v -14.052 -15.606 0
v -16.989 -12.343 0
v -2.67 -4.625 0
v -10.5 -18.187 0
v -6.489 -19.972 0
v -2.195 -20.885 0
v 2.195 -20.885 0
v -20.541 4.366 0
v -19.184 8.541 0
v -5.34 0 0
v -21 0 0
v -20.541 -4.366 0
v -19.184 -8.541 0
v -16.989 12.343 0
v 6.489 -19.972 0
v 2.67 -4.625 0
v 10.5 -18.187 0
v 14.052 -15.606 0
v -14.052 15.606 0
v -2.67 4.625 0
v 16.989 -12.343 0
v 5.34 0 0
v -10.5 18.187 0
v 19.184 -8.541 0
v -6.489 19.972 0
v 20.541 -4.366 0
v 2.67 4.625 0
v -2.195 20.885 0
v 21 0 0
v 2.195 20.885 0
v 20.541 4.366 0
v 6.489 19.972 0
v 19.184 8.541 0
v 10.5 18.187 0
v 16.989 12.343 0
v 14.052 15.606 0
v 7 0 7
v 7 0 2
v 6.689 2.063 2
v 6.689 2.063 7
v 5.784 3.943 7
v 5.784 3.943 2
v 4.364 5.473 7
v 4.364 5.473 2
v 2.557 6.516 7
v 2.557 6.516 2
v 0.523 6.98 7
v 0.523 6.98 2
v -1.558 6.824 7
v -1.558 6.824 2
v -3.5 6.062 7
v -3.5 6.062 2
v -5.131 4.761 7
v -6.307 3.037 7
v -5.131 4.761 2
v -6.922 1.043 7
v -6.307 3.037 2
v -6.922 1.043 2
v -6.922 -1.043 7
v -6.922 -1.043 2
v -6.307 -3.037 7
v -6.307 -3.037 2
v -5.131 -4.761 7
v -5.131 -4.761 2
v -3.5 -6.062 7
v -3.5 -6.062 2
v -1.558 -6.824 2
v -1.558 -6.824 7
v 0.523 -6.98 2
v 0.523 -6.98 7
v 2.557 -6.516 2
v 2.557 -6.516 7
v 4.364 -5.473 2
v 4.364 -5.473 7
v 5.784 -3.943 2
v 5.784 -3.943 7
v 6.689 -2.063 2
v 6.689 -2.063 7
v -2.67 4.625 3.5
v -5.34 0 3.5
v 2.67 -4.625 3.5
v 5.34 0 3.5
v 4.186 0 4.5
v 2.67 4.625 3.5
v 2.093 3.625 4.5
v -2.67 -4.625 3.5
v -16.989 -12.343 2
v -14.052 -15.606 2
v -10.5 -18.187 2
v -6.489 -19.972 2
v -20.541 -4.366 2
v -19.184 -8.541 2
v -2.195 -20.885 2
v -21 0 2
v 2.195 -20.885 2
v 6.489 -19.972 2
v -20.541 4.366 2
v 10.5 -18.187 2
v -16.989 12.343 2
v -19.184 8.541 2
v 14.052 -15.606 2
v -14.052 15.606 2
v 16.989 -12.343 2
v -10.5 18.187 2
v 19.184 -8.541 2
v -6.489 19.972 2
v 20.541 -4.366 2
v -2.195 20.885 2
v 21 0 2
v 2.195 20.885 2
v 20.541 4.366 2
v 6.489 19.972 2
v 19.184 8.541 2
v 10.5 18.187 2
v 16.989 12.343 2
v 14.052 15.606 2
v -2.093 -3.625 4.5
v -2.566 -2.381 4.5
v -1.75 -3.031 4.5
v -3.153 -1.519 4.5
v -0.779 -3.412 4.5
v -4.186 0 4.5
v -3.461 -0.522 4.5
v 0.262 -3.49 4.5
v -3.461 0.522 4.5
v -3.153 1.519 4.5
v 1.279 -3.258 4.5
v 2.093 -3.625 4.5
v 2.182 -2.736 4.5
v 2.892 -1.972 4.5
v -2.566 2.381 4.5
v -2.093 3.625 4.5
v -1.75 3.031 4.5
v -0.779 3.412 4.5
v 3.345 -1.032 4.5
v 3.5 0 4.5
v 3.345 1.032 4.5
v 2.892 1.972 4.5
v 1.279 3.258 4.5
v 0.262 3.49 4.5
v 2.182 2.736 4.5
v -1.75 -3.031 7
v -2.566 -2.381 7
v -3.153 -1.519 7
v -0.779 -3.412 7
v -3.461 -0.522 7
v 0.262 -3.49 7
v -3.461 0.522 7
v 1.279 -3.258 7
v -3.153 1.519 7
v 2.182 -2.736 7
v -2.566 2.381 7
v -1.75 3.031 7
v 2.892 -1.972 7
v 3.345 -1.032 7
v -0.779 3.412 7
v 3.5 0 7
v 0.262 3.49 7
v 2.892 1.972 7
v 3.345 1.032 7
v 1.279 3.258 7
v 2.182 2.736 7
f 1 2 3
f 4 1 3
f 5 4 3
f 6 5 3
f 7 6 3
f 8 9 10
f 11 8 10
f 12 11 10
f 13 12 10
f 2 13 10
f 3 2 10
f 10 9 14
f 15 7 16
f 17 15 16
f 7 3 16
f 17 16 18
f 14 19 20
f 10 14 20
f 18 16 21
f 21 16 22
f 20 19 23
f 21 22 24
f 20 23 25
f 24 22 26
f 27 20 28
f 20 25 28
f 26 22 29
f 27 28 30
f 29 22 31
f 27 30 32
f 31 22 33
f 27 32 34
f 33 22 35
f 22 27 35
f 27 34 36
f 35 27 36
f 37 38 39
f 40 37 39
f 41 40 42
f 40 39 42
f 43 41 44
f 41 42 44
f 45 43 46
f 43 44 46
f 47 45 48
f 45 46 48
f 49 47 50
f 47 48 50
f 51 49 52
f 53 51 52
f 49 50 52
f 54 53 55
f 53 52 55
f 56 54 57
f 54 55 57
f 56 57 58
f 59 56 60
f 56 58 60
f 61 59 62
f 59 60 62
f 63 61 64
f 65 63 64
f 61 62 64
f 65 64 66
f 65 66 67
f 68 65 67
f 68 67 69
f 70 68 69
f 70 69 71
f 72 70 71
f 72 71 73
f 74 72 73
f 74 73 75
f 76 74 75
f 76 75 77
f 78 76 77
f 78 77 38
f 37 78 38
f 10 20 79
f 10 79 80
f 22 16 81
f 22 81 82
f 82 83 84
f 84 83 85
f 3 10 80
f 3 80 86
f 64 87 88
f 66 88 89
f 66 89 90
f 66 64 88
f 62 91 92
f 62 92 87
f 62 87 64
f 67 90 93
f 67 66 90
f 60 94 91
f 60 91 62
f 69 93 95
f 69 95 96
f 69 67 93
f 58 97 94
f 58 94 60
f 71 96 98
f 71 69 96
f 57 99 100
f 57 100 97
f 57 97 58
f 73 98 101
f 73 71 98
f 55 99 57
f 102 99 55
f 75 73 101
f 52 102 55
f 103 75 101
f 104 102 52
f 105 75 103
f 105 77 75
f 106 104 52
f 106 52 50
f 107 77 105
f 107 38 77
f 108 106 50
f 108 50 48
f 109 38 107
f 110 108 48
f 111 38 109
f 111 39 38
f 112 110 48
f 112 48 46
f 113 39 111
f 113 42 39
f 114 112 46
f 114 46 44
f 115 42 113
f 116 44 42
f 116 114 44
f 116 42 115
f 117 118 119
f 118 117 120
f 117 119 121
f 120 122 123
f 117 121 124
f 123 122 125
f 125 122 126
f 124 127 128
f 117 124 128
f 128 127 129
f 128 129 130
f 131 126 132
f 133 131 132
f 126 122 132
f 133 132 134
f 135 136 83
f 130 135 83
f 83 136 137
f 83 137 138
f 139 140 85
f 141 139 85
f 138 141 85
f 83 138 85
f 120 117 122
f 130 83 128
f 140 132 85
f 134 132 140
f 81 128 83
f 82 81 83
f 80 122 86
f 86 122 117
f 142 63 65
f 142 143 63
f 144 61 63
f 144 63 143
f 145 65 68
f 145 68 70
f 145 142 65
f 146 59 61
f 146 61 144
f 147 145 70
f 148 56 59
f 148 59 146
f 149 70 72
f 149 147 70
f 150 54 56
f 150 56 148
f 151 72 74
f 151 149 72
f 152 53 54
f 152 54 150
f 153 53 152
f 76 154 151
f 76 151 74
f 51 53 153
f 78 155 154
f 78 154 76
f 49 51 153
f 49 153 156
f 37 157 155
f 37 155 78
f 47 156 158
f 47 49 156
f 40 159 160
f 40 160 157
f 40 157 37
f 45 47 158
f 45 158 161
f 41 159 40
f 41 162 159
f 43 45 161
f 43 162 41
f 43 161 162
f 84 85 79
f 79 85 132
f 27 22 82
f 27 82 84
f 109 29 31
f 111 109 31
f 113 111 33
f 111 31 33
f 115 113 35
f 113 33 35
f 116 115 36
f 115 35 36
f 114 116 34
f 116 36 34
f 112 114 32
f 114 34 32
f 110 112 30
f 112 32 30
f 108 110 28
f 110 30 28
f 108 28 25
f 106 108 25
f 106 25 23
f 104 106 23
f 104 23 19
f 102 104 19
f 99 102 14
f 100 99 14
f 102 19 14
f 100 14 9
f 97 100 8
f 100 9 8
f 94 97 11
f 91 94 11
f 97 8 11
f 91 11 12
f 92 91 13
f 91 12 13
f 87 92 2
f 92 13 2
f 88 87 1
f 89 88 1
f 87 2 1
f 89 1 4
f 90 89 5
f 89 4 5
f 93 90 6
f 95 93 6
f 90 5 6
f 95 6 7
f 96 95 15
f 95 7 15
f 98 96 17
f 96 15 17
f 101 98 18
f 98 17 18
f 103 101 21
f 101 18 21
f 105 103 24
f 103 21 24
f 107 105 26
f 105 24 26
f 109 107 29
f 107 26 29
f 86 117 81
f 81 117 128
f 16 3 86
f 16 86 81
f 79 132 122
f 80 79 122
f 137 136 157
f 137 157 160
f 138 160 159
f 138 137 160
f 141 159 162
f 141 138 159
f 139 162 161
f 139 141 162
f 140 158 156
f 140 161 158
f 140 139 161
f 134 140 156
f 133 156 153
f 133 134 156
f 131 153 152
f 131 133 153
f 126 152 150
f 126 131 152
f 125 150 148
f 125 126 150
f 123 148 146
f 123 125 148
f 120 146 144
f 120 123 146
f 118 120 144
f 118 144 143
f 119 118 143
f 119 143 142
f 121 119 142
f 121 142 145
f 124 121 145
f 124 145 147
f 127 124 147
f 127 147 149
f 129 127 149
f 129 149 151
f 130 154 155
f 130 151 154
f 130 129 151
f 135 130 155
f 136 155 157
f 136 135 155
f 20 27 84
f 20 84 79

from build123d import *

# Parameters (mm, degrees)
SKETCH_R     = 21
PAD_DEPTH    = 2
SKETCH001_R  = 7
PAD001_DEPTH = 7
SKETCH002_R  = 3.5
HOLE_DEPTH   = 7.001
POCKET_DEPTH = 4.5
CHAMFER_SIZE = 1


with BuildPart() as part:
    # Sketch → Pad (new body)
    with BuildSketch(Plane.XY):
        Circle(SKETCH_R)
    extrude(amount=PAD_DEPTH)

    # Sketch001 → Pad001 (join)
    with BuildSketch(Plane.XY):
        Circle(SKETCH001_R)
    extrude(amount=PAD001_DEPTH)

    # Sketch002 → Hole (cut, through all)
    with BuildSketch(Plane.XY):
        Circle(SKETCH002_R)
    extrude(amount=HOLE_DEPTH, mode=Mode.SUBTRACT)

    # Sketch003 → Pocket (cut)
    with BuildSketch(Plane.XY):
        Polygon((2.670245, -4.625), (5.34049, 0), (2.670245, 4.625), (-2.670245, 4.625), (-5.34049, 0), (-2.670245, -4.625), align=None)
    extrude(amount=POCKET_DEPTH, mode=Mode.SUBTRACT)

    # Chamfer
    chamfer_edges = [part.edges().sort_by_distance(p)[0] for p in [
        (-4.005367, -2.3125, 4.5),
        (0, -4.625, 4.5),
        (4.005367, -2.3125, 4.5),
        (4.005367, 2.3125, 4.5),
        (0, 4.625, 4.5),
        (-4.005367, 2.3125, 4.5),
    ]]
    chamfer(chamfer_edges, length=CHAMFER_SIZE)


solid = part.part
